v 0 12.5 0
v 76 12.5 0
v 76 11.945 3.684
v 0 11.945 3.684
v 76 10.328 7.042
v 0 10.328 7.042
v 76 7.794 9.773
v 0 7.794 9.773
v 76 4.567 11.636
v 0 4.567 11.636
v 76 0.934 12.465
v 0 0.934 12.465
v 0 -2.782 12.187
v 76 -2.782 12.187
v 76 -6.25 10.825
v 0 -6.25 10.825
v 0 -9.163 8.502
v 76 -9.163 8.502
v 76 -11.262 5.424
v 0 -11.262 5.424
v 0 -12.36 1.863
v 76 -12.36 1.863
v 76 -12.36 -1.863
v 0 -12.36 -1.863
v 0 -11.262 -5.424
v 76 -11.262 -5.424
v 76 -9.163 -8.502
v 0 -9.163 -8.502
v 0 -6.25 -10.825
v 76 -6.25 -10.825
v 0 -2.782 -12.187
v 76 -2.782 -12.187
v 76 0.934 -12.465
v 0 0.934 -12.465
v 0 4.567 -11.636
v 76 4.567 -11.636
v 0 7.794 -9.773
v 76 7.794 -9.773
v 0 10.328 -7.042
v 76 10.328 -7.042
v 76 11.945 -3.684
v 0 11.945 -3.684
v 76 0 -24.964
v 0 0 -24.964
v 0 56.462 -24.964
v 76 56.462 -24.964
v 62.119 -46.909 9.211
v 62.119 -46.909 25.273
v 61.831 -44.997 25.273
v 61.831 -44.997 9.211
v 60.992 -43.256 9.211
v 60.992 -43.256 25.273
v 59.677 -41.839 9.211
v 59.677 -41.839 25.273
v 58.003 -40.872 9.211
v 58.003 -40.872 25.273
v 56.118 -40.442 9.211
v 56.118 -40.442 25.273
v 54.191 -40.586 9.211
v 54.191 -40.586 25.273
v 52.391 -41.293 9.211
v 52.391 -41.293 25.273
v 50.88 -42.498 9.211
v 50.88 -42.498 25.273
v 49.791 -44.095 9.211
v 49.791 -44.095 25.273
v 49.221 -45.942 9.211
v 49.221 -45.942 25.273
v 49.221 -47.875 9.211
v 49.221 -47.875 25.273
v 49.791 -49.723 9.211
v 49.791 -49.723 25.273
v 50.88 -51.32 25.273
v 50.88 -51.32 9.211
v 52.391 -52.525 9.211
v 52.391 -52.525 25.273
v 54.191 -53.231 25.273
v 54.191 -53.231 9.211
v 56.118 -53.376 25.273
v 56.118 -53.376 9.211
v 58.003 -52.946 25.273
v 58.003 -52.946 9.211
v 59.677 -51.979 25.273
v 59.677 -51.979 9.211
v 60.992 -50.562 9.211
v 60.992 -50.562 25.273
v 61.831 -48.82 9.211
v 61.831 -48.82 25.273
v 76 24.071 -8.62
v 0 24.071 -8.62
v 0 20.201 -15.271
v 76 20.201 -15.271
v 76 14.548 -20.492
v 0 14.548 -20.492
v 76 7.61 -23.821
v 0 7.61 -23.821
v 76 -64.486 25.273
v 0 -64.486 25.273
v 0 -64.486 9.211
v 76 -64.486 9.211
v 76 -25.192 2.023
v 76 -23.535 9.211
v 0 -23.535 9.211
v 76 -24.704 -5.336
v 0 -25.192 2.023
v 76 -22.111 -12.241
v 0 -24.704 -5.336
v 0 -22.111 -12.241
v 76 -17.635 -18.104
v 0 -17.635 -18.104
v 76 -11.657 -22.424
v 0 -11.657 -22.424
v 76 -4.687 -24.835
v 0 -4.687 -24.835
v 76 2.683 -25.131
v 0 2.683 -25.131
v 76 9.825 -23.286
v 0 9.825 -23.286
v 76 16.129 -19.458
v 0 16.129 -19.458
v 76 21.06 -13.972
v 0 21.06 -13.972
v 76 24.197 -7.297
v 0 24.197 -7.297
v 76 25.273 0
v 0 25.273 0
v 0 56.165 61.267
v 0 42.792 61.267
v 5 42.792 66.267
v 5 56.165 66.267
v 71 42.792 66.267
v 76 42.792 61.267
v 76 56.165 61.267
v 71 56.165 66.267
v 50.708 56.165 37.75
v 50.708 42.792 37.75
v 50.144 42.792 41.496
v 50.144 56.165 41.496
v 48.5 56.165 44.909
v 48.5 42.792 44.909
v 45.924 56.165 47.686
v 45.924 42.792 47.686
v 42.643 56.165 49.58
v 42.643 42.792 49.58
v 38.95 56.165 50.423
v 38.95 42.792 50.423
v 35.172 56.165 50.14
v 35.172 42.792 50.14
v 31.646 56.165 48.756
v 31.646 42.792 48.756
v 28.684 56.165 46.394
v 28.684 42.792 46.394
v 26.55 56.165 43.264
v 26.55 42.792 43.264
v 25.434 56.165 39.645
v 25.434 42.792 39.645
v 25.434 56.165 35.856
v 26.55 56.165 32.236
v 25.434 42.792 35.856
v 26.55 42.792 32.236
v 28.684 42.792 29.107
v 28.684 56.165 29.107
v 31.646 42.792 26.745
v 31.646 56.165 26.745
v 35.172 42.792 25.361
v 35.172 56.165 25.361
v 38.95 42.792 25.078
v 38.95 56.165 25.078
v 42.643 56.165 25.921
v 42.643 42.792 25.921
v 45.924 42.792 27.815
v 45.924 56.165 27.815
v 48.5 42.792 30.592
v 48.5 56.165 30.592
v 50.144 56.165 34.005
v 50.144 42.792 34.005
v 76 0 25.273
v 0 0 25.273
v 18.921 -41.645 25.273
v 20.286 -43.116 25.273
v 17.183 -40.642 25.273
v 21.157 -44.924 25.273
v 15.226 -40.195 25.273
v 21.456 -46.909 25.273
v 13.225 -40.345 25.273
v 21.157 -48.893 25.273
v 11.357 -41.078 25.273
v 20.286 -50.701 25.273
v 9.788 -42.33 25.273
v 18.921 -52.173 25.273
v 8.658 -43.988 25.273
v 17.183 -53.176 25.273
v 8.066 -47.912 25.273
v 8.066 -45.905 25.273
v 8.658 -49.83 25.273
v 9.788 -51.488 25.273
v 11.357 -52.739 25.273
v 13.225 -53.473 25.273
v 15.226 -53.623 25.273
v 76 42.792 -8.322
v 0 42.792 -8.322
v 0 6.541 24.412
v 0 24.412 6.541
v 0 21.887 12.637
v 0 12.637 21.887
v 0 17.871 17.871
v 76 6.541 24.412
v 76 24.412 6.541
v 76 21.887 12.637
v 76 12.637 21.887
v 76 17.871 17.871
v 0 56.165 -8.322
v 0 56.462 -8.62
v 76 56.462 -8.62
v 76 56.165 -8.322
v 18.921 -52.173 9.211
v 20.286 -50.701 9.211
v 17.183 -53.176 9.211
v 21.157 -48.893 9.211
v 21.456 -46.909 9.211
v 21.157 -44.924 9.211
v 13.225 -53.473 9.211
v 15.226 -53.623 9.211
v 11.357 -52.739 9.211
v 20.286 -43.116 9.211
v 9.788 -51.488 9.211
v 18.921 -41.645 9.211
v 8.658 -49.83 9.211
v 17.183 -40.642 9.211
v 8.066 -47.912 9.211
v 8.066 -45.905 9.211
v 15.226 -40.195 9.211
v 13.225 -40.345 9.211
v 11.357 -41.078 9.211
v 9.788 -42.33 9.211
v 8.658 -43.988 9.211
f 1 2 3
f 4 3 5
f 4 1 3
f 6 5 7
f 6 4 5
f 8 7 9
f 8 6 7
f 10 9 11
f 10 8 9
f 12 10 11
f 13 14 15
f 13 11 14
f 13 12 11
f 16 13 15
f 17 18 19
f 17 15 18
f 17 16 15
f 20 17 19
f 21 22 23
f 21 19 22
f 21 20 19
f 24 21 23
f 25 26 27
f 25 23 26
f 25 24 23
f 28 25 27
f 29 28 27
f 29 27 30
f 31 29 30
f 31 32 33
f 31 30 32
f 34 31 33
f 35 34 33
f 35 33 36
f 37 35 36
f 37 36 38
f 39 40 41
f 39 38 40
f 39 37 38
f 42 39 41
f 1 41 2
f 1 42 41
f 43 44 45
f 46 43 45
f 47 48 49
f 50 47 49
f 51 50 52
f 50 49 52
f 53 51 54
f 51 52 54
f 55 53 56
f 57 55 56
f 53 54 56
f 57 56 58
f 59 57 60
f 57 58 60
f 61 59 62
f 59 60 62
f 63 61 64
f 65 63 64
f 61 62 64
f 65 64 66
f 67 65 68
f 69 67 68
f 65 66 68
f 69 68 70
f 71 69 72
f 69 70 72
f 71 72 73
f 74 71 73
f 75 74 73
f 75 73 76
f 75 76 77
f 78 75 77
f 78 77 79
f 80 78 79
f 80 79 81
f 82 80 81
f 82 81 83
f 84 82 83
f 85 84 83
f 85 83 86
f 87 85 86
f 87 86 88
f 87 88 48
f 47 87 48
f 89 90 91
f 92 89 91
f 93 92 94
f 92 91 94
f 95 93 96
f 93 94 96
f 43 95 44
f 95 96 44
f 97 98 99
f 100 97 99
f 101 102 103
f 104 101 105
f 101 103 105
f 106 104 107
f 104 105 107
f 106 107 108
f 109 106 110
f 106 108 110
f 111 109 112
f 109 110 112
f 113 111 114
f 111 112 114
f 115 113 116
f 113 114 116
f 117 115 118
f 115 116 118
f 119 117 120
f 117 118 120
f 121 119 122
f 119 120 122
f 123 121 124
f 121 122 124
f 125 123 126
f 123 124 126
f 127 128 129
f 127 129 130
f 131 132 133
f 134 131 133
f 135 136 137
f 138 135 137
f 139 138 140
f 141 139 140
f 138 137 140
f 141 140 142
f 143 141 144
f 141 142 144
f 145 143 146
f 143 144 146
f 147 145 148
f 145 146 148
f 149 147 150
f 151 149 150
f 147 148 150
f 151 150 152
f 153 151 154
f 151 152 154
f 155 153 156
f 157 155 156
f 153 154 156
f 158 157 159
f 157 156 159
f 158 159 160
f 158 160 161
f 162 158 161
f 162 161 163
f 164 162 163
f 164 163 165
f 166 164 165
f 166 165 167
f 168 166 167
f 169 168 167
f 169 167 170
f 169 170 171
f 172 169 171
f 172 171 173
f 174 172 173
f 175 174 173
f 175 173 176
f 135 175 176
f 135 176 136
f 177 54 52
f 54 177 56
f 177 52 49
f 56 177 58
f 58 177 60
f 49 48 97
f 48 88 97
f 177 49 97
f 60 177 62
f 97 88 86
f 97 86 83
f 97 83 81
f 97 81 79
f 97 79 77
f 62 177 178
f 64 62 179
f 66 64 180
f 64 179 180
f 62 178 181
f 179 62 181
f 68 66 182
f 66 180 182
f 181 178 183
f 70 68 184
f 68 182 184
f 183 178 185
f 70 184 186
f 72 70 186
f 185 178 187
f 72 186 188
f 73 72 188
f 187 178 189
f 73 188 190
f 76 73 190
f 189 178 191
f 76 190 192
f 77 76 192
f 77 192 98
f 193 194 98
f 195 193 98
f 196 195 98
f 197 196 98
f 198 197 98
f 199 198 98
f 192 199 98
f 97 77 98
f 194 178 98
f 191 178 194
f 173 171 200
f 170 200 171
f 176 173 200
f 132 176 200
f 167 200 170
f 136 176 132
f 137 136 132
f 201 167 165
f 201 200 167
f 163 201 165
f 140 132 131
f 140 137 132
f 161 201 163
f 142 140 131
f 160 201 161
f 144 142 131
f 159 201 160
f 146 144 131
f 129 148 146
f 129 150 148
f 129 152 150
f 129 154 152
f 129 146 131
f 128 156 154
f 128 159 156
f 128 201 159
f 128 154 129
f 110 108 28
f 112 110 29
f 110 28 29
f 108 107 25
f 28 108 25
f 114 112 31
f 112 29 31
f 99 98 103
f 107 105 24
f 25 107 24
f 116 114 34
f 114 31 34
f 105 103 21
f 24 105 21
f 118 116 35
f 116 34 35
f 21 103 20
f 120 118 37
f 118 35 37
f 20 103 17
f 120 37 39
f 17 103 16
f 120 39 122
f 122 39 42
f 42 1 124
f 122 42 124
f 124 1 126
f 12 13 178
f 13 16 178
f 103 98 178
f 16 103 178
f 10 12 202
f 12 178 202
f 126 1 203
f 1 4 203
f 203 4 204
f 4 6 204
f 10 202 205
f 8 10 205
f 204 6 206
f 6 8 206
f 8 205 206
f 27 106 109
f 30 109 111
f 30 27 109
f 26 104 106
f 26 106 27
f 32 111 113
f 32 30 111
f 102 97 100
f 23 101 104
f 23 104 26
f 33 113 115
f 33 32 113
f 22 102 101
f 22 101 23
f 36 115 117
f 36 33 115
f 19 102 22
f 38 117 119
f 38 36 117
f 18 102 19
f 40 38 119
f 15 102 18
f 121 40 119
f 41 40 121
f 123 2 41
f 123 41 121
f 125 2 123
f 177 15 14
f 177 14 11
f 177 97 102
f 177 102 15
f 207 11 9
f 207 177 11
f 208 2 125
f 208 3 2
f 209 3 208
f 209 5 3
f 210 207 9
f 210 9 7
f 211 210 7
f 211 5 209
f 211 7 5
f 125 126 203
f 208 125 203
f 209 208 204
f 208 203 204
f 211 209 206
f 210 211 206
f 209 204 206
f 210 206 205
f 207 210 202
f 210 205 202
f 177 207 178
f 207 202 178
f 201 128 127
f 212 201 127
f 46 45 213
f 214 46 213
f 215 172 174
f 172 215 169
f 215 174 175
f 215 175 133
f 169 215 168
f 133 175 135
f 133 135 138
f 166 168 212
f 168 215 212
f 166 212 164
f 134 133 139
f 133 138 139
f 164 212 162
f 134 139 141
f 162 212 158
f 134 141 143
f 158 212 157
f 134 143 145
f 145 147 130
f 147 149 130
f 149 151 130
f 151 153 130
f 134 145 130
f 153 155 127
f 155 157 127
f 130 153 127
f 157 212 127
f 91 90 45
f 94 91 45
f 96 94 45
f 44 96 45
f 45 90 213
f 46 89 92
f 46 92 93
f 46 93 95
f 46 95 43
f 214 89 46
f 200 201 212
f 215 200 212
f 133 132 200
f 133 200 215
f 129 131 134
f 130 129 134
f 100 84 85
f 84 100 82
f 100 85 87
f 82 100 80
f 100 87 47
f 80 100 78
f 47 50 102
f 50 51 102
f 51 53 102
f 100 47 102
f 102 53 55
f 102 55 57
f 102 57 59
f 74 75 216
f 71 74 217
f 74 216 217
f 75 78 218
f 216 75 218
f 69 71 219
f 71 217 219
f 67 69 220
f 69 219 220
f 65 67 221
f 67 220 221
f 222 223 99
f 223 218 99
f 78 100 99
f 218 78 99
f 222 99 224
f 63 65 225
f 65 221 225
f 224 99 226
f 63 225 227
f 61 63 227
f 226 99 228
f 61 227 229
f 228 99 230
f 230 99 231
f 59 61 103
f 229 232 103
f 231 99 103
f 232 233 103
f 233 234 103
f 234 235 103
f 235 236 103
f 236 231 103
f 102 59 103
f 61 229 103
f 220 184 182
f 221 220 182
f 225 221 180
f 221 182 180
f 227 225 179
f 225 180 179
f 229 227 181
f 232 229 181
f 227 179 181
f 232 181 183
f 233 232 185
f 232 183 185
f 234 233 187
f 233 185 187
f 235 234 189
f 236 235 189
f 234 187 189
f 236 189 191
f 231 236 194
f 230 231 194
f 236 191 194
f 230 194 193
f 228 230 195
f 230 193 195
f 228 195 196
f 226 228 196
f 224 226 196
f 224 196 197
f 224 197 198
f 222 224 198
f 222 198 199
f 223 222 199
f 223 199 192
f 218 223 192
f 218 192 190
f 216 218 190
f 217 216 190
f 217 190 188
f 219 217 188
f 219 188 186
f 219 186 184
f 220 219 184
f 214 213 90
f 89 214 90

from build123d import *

# Parameters (mm, degrees)
F4_DEPTH  = 76
F3_W      = 13.3726410568
F3_H      = 74.5896287262
F5_SIZE   = 5
F0_R      = 12.5
F6_DEPTH  = 113
F7_R      = 12.7084300736
F8_DEPTH  = 25
F9_R      = 6.7325080712
F9_R_2    = 6.4850618684
F10_DEPTH = 25


with BuildPart() as f4:
    # F1 (on Right) → F4 (new body)
    with BuildSketch(Plane.YZ):
        with BuildLine():
            ThreePointArc((-23.5353756384, 9.210575372), (-14.2471987878, 20.8750073491), (0, 25.2734763165))
            Line((0, 25.2734763165), (-64.48584795, 25.2734763165))
            Line((-64.48584795, 25.2734763165), (-64.48584795, 9.210575372))
            Line((-64.48584795, 9.210575372), (-23.5353756384, 9.210575372))
        make_face()
        with BuildLine():
            ThreePointArc((-23.5353756384, 9.210575372), (-4.6865683781, -24.8351501296), (25.2734763165, 0))
            ThreePointArc((25.2734763165, 0), (17.8710464876, 17.8710464876), (0, 25.2734763165))
            ThreePointArc((0, 25.2734763165), (-14.2471987878, 20.8750073491), (-23.5353756384, 9.210575372))
        make_face()
    extrude(amount=F4_DEPTH)

    # F0 (on Right) → F6 (cut)
    with BuildSketch(Plane.YZ):
        Circle(F0_R)
    extrude(amount=F6_DEPTH, mode=Mode.SUBTRACT)

    # F9 (on face) → F10 (cut)
    with BuildSketch(Plane.XY.offset(25.2734763165)):
        with Locations((14.7232953459, -46.90887779)):
            Circle(F9_R)
        with Locations((55.63364923, -46.90887779)):
            Circle(F9_R_2)
    extrude(amount=-F10_DEPTH, mode=Mode.SUBTRACT)


with BuildPart() as f4b:
    # F2 (on Right) → F4, piece 2 (new body)
    with BuildSketch(Plane.YZ):
        with BuildLine():
            ThreePointArc((24.0707546473, -8.6196139455), (14.5476690251, -20.491704497), (0, -24.9639544636))
            Line((0, -24.9639544636), (56.4622692764, -24.9639544636))
            Line((56.4622692764, -24.9639544636), (56.4622692764, -8.6196139455))
            Line((56.4622692764, -8.6196139455), (24.0707546473, -8.6196139455))
        make_face()
    extrude(amount=F4_DEPTH)


with BuildPart() as f4c:
    # F3 (on Right) → F4, piece 3 (new body)
    with BuildSketch(Plane.YZ):
        with Locations((49.4787786156, 28.97237055)):
            Rectangle(F3_W, F3_H)
    extrude(amount=F4_DEPTH)

    # F5
    f5_edges = [f4c.edges().sort_by_distance(p)[0] for p in [
        (76, 49.478779, 66.267185),
        (0, 49.478779, 66.267185),
    ]]
    chamfer(f5_edges, length=F5_SIZE)

    # F7 (on face) → F8 (cut)
    with BuildSketch(Plane.XZ.offset(-42.7924580872)):
        with Locations((38, 37.7504602075)):
            Circle(F7_R)
    extrude(amount=-F8_DEPTH, mode=Mode.SUBTRACT)


solid = Compound([f4.part, f4b.part, f4c.part])
